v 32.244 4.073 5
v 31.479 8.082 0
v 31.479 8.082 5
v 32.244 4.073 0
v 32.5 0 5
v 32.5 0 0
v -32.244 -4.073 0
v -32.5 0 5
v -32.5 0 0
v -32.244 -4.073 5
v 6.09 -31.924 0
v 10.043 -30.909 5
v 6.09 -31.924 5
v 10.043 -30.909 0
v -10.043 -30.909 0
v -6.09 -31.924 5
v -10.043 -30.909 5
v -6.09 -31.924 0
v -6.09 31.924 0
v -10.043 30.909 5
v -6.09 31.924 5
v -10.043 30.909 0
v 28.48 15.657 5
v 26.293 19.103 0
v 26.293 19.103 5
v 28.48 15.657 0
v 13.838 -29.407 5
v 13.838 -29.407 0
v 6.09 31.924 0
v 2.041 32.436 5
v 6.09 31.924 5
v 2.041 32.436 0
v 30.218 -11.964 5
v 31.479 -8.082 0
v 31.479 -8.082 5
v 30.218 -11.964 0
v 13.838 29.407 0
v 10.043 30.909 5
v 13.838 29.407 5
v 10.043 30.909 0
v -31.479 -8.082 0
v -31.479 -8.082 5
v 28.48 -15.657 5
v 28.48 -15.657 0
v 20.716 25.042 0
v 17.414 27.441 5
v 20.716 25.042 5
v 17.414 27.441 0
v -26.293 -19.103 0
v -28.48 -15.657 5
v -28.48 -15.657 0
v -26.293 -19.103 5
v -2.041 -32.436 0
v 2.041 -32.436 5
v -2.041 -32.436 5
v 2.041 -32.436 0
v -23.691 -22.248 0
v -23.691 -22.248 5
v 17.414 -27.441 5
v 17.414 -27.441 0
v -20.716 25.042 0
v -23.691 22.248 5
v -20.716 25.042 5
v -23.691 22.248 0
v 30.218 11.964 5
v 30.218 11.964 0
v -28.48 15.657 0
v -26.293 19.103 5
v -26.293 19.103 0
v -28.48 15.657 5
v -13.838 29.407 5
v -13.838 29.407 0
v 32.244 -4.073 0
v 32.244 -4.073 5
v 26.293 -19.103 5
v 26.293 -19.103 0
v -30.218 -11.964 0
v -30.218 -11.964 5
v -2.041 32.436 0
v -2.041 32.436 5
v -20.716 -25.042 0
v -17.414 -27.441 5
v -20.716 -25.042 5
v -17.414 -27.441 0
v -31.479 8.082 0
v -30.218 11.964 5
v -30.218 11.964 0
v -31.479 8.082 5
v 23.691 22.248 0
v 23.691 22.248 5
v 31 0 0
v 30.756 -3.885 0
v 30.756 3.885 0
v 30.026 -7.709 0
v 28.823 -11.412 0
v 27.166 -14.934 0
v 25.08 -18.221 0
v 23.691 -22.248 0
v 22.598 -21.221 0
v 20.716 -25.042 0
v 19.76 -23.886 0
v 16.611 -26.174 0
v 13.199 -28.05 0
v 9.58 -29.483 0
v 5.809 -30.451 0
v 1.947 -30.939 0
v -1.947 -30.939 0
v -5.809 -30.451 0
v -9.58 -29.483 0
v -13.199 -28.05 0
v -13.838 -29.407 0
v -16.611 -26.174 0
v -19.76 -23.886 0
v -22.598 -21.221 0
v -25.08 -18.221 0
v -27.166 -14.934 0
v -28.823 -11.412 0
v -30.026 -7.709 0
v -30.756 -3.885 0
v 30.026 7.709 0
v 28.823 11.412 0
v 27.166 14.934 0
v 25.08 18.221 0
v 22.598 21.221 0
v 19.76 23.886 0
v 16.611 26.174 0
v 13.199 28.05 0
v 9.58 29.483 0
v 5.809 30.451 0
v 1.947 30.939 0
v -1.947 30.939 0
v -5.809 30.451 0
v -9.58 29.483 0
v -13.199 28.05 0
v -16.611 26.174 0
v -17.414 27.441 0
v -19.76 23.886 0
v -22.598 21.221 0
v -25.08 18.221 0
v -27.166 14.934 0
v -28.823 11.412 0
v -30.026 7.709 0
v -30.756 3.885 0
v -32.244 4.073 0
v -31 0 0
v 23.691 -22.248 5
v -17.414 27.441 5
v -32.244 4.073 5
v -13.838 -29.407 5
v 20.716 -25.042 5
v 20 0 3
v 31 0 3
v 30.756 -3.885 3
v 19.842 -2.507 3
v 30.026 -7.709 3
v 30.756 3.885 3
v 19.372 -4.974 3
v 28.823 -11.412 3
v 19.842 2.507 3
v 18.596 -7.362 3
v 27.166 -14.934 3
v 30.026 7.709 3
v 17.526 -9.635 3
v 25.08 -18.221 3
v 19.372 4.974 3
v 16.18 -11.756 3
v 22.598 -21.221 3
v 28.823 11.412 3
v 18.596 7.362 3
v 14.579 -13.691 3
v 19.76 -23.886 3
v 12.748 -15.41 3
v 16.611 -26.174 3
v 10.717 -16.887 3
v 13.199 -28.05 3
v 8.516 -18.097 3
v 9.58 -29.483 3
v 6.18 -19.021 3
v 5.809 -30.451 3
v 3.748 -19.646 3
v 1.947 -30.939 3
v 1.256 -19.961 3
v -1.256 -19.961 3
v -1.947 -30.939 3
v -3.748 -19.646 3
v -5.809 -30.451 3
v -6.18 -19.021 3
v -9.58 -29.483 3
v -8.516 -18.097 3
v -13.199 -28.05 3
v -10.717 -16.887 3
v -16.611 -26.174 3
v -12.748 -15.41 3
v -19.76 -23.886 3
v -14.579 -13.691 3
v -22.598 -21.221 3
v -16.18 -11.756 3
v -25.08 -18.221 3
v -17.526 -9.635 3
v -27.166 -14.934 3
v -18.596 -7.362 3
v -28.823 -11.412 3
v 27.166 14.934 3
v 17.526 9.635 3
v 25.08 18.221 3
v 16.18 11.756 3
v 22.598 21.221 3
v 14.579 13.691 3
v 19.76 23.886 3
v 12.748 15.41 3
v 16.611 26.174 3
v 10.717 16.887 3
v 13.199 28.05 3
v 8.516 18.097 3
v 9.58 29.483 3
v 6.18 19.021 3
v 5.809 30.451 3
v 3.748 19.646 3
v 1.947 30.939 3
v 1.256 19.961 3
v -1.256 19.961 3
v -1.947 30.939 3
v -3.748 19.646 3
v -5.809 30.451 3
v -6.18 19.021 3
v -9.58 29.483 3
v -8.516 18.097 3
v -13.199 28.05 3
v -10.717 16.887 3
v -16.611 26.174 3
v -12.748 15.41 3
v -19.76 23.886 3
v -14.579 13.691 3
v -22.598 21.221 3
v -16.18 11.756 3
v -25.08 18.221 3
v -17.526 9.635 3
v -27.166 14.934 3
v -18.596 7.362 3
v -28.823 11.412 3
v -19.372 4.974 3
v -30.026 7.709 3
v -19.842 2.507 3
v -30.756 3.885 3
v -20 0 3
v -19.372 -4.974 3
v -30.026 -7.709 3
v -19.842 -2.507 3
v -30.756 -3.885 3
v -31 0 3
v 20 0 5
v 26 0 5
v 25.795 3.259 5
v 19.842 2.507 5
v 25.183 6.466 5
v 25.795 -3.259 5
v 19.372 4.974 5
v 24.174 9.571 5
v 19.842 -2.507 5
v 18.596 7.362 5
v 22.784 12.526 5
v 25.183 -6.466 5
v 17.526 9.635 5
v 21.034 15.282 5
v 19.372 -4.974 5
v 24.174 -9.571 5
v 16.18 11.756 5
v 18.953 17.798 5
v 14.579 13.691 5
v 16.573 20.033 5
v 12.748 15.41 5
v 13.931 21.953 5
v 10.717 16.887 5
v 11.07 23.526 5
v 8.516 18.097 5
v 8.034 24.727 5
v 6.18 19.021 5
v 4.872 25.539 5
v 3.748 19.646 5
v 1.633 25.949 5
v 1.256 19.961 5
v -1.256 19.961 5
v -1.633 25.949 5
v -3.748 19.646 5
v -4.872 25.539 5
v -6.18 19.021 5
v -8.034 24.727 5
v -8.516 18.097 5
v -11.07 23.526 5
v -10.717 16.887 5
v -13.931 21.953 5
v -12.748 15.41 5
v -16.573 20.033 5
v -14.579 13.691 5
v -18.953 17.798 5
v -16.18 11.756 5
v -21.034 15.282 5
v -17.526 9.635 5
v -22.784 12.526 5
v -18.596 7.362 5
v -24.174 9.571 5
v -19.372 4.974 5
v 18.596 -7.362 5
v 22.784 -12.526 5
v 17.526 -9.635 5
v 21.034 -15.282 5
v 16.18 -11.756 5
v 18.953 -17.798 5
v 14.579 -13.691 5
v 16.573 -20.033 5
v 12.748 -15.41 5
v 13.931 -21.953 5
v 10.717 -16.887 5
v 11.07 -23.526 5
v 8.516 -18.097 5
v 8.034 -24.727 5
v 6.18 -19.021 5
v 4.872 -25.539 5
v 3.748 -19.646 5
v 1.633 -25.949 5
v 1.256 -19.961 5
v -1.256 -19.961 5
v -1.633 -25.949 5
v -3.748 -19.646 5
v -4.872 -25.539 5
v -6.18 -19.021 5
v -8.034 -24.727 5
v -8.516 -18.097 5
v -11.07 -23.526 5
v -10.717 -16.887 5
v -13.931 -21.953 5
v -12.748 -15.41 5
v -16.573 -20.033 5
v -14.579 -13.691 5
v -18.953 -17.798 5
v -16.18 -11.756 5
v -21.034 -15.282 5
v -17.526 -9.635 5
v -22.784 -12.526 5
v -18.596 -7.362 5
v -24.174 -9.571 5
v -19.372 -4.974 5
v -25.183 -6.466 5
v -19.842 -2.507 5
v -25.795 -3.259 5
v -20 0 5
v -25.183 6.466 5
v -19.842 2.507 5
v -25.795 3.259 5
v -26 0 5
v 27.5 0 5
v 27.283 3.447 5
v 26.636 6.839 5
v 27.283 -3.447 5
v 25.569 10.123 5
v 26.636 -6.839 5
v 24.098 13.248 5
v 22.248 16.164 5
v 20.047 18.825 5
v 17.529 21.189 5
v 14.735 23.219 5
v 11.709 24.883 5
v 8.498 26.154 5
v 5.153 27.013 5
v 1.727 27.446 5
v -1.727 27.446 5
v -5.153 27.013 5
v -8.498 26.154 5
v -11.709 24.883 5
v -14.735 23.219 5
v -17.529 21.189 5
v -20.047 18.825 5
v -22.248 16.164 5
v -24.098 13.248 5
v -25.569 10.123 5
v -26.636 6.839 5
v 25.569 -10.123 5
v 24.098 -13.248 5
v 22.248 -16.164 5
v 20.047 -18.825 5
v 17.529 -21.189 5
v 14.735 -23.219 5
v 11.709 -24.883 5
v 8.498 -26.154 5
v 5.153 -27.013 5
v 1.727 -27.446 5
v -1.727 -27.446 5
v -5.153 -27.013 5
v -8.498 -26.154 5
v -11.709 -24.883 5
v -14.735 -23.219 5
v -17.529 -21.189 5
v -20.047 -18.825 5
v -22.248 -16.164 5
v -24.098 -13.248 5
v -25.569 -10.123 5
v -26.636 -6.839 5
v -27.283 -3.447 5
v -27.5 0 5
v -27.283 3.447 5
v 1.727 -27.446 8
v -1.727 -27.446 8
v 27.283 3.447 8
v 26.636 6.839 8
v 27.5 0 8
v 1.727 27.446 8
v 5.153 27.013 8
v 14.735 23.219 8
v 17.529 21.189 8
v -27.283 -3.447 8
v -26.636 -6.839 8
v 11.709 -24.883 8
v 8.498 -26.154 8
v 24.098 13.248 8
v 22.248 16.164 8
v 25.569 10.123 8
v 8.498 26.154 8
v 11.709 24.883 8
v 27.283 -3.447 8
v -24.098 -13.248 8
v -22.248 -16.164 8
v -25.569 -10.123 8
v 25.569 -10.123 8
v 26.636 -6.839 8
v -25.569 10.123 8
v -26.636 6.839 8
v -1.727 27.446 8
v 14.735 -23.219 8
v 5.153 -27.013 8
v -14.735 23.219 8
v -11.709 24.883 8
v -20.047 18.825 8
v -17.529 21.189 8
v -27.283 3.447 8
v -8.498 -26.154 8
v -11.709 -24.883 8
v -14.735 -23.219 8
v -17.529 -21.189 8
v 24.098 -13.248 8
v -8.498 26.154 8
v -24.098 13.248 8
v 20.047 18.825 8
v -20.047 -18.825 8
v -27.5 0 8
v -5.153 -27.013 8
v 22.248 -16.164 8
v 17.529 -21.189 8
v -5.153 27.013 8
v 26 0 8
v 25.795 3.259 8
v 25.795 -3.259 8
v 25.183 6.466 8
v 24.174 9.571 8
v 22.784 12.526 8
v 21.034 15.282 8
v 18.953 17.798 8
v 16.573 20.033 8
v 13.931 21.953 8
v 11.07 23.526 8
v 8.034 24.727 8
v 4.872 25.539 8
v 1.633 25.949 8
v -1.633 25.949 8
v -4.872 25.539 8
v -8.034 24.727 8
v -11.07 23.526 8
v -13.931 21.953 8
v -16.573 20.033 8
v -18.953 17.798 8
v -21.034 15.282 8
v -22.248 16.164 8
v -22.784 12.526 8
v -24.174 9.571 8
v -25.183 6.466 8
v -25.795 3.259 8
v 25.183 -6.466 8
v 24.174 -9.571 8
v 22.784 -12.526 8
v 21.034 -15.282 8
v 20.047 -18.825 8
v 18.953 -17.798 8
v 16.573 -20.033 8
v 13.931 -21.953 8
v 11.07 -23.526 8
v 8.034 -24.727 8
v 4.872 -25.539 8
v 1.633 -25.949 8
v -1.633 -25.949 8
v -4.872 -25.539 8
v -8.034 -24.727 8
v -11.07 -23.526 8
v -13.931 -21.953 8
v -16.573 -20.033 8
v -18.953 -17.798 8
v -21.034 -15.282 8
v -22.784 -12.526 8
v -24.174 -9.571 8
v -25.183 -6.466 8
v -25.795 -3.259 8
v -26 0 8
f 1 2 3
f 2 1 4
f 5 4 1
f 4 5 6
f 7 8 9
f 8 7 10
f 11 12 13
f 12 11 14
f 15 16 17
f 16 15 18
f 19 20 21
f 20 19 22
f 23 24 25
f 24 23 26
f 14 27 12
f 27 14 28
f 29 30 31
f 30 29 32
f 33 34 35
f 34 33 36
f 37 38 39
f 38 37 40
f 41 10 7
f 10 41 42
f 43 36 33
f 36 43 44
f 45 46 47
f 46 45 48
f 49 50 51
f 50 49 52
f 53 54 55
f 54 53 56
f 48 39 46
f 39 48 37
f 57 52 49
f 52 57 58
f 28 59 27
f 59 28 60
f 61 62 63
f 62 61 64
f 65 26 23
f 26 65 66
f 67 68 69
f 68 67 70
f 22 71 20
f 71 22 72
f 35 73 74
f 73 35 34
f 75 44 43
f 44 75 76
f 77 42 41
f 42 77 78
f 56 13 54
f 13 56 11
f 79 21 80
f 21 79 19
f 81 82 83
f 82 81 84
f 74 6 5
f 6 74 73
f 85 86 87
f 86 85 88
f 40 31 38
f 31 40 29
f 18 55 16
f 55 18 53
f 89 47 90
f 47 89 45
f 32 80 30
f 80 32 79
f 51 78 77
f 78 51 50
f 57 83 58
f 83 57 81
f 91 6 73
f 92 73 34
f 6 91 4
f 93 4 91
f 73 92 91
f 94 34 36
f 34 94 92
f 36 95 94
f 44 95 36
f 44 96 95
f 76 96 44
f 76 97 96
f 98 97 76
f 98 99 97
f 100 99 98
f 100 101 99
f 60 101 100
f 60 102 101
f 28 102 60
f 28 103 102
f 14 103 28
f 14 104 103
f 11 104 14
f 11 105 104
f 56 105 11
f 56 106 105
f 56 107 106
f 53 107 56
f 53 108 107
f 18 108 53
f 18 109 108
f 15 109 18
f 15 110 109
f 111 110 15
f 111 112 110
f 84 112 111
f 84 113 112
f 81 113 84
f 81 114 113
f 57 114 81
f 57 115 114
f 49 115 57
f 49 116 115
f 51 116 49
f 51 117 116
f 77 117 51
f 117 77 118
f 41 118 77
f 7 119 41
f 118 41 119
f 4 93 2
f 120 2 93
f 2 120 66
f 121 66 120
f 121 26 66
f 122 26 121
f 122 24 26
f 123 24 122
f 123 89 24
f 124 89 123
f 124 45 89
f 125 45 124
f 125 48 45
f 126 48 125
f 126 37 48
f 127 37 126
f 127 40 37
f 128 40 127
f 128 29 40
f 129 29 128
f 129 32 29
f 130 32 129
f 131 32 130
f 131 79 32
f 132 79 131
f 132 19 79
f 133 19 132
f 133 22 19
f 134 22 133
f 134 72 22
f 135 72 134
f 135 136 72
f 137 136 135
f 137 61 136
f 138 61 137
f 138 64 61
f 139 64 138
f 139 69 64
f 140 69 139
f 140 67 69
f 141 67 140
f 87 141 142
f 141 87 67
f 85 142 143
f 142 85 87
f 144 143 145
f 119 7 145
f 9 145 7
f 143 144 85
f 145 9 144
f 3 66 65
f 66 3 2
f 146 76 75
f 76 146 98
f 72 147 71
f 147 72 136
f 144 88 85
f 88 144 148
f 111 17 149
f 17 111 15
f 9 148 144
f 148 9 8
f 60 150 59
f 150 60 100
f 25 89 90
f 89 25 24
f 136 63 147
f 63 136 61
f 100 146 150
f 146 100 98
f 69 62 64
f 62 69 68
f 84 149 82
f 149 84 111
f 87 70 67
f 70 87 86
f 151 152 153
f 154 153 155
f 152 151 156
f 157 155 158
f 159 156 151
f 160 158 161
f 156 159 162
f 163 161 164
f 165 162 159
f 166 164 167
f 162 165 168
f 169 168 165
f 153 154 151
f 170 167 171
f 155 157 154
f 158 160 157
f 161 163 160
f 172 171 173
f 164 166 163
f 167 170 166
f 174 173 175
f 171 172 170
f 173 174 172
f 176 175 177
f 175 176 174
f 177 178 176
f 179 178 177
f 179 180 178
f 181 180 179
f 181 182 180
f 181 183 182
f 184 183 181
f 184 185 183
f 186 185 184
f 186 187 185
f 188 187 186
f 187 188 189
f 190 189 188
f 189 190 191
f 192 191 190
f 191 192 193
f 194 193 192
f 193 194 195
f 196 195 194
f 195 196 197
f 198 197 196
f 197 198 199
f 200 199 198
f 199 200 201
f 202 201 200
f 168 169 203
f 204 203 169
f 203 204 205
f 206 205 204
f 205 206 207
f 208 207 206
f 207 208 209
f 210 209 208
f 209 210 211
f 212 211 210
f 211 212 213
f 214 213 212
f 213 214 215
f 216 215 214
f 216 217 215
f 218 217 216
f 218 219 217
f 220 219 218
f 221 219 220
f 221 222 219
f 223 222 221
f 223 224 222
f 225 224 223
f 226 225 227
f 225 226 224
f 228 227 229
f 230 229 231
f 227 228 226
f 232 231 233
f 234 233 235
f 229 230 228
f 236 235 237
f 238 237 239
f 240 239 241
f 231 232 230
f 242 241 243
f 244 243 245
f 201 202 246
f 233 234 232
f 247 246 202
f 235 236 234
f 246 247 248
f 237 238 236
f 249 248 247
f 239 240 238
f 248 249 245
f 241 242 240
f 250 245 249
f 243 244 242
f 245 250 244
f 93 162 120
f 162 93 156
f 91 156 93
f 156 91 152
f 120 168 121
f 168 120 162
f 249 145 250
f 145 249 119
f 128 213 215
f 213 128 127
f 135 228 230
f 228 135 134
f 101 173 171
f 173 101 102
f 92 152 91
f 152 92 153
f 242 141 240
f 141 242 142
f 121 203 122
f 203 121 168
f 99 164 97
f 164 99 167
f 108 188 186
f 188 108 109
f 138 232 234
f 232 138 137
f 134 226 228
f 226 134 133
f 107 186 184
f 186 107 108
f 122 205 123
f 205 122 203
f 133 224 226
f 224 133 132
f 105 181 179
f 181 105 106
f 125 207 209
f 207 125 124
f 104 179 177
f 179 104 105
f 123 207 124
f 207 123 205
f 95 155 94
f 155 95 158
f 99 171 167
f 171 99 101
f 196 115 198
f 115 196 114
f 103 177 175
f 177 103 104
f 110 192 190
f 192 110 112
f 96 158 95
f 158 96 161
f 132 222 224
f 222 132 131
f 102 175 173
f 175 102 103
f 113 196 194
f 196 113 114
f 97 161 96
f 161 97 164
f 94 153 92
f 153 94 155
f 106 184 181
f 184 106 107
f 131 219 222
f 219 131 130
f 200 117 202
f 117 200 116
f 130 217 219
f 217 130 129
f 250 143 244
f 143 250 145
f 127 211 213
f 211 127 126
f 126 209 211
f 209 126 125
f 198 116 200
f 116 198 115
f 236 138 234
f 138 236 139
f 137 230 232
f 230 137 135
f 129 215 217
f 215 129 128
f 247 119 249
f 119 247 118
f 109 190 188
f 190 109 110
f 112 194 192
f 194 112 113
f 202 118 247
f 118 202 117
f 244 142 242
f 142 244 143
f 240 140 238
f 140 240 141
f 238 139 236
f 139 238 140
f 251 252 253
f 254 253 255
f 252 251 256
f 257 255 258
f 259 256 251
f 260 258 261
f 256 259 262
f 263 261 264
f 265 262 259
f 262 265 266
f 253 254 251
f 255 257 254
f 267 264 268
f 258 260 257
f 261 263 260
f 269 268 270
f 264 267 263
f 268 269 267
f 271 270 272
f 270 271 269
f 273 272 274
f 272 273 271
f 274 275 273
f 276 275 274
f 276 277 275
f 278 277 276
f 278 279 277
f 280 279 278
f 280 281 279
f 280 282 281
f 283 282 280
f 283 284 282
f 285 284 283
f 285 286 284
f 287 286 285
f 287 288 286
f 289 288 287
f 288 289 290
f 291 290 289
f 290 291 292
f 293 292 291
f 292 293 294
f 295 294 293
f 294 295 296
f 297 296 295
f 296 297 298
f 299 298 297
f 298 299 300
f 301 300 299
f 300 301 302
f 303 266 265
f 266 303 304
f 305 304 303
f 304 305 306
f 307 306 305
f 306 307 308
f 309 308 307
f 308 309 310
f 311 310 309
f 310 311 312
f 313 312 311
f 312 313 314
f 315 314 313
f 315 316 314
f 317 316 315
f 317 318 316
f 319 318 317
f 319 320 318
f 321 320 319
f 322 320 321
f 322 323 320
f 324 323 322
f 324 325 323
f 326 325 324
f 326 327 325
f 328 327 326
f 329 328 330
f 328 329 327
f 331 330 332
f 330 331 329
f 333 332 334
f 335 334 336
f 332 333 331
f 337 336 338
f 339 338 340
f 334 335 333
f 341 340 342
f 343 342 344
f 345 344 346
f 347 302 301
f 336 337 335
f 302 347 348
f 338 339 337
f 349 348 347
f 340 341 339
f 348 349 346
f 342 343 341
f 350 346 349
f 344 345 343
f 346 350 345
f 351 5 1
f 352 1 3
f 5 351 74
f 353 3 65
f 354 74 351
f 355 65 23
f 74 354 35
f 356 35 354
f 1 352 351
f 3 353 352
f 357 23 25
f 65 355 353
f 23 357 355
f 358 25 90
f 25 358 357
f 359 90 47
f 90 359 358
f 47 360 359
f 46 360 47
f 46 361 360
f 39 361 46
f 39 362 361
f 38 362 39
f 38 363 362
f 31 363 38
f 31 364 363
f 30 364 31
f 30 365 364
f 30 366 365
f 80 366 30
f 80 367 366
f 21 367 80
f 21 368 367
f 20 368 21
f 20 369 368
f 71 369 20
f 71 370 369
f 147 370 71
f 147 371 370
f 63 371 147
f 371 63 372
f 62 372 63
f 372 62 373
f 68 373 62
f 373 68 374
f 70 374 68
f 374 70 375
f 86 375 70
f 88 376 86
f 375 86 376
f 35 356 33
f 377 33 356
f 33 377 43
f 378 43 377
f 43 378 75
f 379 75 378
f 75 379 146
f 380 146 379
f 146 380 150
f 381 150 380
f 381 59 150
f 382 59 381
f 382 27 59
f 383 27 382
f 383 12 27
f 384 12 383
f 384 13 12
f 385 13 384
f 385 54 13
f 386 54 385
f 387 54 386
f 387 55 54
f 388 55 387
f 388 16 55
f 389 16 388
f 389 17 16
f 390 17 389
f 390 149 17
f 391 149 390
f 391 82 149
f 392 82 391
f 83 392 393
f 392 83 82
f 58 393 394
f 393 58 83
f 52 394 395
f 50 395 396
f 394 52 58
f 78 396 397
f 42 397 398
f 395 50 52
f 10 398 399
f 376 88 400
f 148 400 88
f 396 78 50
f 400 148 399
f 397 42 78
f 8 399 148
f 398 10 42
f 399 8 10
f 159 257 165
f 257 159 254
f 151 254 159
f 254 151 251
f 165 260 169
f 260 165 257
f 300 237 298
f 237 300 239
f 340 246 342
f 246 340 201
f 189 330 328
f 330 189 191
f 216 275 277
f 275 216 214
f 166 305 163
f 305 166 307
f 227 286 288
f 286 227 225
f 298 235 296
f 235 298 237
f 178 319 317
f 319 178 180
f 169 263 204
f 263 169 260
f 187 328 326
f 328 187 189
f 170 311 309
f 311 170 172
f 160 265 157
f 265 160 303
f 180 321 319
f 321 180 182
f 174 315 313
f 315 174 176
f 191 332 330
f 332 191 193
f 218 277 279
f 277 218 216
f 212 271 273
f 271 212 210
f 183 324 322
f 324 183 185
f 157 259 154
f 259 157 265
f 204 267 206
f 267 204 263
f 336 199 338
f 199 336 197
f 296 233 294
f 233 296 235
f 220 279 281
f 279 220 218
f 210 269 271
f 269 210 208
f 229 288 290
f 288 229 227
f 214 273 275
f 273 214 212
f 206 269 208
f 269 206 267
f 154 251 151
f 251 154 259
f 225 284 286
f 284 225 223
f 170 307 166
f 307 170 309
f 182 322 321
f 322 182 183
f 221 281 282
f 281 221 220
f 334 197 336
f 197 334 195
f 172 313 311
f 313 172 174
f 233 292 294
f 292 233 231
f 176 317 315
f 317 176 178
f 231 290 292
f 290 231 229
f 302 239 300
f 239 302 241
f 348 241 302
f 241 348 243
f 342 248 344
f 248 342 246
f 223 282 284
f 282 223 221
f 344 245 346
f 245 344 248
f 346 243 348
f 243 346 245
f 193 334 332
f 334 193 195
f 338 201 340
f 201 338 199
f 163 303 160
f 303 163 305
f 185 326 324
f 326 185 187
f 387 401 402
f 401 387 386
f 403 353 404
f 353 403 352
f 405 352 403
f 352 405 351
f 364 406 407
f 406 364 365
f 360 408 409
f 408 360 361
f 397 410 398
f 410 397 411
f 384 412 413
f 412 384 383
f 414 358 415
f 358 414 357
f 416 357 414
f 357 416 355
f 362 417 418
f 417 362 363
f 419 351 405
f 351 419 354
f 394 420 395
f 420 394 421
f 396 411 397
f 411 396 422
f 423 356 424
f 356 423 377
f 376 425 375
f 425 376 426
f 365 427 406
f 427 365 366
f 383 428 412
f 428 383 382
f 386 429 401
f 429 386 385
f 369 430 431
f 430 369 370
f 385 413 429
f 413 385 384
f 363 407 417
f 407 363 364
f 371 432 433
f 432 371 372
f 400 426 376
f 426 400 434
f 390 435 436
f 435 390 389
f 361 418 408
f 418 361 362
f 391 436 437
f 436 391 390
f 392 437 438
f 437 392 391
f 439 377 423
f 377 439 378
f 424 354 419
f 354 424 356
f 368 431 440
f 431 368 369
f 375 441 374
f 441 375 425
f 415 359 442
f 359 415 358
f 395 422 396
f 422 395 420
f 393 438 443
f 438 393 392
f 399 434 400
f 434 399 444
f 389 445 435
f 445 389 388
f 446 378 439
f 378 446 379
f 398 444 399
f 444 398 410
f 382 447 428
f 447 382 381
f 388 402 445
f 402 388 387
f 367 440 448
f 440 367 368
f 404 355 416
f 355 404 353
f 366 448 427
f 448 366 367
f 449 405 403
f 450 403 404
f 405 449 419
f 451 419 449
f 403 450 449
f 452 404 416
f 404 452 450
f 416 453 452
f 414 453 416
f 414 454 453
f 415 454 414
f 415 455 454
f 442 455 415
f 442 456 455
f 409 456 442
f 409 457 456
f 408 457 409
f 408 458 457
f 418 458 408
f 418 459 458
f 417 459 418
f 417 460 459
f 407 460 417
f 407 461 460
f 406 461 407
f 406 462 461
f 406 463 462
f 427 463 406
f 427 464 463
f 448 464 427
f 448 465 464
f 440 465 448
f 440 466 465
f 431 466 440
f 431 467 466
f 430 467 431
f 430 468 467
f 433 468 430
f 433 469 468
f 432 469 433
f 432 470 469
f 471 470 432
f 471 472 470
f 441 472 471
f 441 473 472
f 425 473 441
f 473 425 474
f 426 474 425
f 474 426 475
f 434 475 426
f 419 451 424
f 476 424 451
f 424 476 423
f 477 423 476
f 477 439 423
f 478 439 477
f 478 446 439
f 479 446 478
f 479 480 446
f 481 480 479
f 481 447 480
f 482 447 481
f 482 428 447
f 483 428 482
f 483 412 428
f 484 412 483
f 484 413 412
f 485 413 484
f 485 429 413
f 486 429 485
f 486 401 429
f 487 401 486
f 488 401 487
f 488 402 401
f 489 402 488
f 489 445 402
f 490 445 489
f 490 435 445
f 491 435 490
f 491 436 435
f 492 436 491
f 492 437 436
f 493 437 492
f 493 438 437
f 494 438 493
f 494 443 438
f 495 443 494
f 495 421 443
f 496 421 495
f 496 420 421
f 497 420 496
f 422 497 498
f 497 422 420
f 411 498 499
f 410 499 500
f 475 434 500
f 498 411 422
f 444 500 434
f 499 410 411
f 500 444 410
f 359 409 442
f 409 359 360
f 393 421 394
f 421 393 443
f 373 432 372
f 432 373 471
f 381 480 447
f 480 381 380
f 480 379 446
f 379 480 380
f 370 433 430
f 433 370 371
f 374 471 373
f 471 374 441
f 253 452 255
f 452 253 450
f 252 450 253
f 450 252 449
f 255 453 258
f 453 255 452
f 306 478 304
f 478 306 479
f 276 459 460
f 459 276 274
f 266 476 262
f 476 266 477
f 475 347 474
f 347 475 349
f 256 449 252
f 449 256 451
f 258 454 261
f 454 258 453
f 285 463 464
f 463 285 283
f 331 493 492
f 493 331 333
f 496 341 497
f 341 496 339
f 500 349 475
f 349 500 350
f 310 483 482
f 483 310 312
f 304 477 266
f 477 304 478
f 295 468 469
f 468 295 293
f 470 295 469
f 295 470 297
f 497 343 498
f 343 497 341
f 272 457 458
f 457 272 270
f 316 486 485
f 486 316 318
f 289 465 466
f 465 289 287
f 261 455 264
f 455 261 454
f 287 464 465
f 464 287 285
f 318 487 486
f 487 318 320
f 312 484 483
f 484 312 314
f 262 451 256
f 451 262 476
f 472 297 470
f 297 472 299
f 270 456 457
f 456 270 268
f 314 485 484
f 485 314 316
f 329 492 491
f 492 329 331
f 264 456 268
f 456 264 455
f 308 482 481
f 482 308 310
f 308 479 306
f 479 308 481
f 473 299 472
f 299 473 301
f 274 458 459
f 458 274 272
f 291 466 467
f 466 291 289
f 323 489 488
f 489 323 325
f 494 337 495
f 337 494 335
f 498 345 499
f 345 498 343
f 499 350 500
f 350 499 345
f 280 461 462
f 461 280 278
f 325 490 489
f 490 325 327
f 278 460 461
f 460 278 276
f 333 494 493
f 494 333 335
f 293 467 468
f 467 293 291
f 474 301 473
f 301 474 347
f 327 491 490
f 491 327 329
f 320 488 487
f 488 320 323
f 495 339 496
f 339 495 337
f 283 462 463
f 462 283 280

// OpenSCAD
Larger_diameter=60;
Minor_diameter=50;
$fn = 50;
principale();

module principale(){
    sotto();
    base();
    sopra();
}
module sotto(){
    difference(){
    cylinder(h=3,d=Larger_diameter+5);
     translate([0,0,-1]){cylinder(h=5,d=Larger_diameter+2);}
    }
    }


module base(){
    difference(){
    translate([0,0,3]){cylinder(h=2,d=Larger_diameter+5);}
     translate([0,0,2]){cylinder(h=5,d=Minor_diameter-10);}
  }
} 
module sopra(){
difference(){
    translate([0,0,5]){cylinder(h=3,d=Minor_diameter+5);}
     translate([0,0,4]){cylinder(h=5,d=Minor_diameter+2);}
  }
} 
 
